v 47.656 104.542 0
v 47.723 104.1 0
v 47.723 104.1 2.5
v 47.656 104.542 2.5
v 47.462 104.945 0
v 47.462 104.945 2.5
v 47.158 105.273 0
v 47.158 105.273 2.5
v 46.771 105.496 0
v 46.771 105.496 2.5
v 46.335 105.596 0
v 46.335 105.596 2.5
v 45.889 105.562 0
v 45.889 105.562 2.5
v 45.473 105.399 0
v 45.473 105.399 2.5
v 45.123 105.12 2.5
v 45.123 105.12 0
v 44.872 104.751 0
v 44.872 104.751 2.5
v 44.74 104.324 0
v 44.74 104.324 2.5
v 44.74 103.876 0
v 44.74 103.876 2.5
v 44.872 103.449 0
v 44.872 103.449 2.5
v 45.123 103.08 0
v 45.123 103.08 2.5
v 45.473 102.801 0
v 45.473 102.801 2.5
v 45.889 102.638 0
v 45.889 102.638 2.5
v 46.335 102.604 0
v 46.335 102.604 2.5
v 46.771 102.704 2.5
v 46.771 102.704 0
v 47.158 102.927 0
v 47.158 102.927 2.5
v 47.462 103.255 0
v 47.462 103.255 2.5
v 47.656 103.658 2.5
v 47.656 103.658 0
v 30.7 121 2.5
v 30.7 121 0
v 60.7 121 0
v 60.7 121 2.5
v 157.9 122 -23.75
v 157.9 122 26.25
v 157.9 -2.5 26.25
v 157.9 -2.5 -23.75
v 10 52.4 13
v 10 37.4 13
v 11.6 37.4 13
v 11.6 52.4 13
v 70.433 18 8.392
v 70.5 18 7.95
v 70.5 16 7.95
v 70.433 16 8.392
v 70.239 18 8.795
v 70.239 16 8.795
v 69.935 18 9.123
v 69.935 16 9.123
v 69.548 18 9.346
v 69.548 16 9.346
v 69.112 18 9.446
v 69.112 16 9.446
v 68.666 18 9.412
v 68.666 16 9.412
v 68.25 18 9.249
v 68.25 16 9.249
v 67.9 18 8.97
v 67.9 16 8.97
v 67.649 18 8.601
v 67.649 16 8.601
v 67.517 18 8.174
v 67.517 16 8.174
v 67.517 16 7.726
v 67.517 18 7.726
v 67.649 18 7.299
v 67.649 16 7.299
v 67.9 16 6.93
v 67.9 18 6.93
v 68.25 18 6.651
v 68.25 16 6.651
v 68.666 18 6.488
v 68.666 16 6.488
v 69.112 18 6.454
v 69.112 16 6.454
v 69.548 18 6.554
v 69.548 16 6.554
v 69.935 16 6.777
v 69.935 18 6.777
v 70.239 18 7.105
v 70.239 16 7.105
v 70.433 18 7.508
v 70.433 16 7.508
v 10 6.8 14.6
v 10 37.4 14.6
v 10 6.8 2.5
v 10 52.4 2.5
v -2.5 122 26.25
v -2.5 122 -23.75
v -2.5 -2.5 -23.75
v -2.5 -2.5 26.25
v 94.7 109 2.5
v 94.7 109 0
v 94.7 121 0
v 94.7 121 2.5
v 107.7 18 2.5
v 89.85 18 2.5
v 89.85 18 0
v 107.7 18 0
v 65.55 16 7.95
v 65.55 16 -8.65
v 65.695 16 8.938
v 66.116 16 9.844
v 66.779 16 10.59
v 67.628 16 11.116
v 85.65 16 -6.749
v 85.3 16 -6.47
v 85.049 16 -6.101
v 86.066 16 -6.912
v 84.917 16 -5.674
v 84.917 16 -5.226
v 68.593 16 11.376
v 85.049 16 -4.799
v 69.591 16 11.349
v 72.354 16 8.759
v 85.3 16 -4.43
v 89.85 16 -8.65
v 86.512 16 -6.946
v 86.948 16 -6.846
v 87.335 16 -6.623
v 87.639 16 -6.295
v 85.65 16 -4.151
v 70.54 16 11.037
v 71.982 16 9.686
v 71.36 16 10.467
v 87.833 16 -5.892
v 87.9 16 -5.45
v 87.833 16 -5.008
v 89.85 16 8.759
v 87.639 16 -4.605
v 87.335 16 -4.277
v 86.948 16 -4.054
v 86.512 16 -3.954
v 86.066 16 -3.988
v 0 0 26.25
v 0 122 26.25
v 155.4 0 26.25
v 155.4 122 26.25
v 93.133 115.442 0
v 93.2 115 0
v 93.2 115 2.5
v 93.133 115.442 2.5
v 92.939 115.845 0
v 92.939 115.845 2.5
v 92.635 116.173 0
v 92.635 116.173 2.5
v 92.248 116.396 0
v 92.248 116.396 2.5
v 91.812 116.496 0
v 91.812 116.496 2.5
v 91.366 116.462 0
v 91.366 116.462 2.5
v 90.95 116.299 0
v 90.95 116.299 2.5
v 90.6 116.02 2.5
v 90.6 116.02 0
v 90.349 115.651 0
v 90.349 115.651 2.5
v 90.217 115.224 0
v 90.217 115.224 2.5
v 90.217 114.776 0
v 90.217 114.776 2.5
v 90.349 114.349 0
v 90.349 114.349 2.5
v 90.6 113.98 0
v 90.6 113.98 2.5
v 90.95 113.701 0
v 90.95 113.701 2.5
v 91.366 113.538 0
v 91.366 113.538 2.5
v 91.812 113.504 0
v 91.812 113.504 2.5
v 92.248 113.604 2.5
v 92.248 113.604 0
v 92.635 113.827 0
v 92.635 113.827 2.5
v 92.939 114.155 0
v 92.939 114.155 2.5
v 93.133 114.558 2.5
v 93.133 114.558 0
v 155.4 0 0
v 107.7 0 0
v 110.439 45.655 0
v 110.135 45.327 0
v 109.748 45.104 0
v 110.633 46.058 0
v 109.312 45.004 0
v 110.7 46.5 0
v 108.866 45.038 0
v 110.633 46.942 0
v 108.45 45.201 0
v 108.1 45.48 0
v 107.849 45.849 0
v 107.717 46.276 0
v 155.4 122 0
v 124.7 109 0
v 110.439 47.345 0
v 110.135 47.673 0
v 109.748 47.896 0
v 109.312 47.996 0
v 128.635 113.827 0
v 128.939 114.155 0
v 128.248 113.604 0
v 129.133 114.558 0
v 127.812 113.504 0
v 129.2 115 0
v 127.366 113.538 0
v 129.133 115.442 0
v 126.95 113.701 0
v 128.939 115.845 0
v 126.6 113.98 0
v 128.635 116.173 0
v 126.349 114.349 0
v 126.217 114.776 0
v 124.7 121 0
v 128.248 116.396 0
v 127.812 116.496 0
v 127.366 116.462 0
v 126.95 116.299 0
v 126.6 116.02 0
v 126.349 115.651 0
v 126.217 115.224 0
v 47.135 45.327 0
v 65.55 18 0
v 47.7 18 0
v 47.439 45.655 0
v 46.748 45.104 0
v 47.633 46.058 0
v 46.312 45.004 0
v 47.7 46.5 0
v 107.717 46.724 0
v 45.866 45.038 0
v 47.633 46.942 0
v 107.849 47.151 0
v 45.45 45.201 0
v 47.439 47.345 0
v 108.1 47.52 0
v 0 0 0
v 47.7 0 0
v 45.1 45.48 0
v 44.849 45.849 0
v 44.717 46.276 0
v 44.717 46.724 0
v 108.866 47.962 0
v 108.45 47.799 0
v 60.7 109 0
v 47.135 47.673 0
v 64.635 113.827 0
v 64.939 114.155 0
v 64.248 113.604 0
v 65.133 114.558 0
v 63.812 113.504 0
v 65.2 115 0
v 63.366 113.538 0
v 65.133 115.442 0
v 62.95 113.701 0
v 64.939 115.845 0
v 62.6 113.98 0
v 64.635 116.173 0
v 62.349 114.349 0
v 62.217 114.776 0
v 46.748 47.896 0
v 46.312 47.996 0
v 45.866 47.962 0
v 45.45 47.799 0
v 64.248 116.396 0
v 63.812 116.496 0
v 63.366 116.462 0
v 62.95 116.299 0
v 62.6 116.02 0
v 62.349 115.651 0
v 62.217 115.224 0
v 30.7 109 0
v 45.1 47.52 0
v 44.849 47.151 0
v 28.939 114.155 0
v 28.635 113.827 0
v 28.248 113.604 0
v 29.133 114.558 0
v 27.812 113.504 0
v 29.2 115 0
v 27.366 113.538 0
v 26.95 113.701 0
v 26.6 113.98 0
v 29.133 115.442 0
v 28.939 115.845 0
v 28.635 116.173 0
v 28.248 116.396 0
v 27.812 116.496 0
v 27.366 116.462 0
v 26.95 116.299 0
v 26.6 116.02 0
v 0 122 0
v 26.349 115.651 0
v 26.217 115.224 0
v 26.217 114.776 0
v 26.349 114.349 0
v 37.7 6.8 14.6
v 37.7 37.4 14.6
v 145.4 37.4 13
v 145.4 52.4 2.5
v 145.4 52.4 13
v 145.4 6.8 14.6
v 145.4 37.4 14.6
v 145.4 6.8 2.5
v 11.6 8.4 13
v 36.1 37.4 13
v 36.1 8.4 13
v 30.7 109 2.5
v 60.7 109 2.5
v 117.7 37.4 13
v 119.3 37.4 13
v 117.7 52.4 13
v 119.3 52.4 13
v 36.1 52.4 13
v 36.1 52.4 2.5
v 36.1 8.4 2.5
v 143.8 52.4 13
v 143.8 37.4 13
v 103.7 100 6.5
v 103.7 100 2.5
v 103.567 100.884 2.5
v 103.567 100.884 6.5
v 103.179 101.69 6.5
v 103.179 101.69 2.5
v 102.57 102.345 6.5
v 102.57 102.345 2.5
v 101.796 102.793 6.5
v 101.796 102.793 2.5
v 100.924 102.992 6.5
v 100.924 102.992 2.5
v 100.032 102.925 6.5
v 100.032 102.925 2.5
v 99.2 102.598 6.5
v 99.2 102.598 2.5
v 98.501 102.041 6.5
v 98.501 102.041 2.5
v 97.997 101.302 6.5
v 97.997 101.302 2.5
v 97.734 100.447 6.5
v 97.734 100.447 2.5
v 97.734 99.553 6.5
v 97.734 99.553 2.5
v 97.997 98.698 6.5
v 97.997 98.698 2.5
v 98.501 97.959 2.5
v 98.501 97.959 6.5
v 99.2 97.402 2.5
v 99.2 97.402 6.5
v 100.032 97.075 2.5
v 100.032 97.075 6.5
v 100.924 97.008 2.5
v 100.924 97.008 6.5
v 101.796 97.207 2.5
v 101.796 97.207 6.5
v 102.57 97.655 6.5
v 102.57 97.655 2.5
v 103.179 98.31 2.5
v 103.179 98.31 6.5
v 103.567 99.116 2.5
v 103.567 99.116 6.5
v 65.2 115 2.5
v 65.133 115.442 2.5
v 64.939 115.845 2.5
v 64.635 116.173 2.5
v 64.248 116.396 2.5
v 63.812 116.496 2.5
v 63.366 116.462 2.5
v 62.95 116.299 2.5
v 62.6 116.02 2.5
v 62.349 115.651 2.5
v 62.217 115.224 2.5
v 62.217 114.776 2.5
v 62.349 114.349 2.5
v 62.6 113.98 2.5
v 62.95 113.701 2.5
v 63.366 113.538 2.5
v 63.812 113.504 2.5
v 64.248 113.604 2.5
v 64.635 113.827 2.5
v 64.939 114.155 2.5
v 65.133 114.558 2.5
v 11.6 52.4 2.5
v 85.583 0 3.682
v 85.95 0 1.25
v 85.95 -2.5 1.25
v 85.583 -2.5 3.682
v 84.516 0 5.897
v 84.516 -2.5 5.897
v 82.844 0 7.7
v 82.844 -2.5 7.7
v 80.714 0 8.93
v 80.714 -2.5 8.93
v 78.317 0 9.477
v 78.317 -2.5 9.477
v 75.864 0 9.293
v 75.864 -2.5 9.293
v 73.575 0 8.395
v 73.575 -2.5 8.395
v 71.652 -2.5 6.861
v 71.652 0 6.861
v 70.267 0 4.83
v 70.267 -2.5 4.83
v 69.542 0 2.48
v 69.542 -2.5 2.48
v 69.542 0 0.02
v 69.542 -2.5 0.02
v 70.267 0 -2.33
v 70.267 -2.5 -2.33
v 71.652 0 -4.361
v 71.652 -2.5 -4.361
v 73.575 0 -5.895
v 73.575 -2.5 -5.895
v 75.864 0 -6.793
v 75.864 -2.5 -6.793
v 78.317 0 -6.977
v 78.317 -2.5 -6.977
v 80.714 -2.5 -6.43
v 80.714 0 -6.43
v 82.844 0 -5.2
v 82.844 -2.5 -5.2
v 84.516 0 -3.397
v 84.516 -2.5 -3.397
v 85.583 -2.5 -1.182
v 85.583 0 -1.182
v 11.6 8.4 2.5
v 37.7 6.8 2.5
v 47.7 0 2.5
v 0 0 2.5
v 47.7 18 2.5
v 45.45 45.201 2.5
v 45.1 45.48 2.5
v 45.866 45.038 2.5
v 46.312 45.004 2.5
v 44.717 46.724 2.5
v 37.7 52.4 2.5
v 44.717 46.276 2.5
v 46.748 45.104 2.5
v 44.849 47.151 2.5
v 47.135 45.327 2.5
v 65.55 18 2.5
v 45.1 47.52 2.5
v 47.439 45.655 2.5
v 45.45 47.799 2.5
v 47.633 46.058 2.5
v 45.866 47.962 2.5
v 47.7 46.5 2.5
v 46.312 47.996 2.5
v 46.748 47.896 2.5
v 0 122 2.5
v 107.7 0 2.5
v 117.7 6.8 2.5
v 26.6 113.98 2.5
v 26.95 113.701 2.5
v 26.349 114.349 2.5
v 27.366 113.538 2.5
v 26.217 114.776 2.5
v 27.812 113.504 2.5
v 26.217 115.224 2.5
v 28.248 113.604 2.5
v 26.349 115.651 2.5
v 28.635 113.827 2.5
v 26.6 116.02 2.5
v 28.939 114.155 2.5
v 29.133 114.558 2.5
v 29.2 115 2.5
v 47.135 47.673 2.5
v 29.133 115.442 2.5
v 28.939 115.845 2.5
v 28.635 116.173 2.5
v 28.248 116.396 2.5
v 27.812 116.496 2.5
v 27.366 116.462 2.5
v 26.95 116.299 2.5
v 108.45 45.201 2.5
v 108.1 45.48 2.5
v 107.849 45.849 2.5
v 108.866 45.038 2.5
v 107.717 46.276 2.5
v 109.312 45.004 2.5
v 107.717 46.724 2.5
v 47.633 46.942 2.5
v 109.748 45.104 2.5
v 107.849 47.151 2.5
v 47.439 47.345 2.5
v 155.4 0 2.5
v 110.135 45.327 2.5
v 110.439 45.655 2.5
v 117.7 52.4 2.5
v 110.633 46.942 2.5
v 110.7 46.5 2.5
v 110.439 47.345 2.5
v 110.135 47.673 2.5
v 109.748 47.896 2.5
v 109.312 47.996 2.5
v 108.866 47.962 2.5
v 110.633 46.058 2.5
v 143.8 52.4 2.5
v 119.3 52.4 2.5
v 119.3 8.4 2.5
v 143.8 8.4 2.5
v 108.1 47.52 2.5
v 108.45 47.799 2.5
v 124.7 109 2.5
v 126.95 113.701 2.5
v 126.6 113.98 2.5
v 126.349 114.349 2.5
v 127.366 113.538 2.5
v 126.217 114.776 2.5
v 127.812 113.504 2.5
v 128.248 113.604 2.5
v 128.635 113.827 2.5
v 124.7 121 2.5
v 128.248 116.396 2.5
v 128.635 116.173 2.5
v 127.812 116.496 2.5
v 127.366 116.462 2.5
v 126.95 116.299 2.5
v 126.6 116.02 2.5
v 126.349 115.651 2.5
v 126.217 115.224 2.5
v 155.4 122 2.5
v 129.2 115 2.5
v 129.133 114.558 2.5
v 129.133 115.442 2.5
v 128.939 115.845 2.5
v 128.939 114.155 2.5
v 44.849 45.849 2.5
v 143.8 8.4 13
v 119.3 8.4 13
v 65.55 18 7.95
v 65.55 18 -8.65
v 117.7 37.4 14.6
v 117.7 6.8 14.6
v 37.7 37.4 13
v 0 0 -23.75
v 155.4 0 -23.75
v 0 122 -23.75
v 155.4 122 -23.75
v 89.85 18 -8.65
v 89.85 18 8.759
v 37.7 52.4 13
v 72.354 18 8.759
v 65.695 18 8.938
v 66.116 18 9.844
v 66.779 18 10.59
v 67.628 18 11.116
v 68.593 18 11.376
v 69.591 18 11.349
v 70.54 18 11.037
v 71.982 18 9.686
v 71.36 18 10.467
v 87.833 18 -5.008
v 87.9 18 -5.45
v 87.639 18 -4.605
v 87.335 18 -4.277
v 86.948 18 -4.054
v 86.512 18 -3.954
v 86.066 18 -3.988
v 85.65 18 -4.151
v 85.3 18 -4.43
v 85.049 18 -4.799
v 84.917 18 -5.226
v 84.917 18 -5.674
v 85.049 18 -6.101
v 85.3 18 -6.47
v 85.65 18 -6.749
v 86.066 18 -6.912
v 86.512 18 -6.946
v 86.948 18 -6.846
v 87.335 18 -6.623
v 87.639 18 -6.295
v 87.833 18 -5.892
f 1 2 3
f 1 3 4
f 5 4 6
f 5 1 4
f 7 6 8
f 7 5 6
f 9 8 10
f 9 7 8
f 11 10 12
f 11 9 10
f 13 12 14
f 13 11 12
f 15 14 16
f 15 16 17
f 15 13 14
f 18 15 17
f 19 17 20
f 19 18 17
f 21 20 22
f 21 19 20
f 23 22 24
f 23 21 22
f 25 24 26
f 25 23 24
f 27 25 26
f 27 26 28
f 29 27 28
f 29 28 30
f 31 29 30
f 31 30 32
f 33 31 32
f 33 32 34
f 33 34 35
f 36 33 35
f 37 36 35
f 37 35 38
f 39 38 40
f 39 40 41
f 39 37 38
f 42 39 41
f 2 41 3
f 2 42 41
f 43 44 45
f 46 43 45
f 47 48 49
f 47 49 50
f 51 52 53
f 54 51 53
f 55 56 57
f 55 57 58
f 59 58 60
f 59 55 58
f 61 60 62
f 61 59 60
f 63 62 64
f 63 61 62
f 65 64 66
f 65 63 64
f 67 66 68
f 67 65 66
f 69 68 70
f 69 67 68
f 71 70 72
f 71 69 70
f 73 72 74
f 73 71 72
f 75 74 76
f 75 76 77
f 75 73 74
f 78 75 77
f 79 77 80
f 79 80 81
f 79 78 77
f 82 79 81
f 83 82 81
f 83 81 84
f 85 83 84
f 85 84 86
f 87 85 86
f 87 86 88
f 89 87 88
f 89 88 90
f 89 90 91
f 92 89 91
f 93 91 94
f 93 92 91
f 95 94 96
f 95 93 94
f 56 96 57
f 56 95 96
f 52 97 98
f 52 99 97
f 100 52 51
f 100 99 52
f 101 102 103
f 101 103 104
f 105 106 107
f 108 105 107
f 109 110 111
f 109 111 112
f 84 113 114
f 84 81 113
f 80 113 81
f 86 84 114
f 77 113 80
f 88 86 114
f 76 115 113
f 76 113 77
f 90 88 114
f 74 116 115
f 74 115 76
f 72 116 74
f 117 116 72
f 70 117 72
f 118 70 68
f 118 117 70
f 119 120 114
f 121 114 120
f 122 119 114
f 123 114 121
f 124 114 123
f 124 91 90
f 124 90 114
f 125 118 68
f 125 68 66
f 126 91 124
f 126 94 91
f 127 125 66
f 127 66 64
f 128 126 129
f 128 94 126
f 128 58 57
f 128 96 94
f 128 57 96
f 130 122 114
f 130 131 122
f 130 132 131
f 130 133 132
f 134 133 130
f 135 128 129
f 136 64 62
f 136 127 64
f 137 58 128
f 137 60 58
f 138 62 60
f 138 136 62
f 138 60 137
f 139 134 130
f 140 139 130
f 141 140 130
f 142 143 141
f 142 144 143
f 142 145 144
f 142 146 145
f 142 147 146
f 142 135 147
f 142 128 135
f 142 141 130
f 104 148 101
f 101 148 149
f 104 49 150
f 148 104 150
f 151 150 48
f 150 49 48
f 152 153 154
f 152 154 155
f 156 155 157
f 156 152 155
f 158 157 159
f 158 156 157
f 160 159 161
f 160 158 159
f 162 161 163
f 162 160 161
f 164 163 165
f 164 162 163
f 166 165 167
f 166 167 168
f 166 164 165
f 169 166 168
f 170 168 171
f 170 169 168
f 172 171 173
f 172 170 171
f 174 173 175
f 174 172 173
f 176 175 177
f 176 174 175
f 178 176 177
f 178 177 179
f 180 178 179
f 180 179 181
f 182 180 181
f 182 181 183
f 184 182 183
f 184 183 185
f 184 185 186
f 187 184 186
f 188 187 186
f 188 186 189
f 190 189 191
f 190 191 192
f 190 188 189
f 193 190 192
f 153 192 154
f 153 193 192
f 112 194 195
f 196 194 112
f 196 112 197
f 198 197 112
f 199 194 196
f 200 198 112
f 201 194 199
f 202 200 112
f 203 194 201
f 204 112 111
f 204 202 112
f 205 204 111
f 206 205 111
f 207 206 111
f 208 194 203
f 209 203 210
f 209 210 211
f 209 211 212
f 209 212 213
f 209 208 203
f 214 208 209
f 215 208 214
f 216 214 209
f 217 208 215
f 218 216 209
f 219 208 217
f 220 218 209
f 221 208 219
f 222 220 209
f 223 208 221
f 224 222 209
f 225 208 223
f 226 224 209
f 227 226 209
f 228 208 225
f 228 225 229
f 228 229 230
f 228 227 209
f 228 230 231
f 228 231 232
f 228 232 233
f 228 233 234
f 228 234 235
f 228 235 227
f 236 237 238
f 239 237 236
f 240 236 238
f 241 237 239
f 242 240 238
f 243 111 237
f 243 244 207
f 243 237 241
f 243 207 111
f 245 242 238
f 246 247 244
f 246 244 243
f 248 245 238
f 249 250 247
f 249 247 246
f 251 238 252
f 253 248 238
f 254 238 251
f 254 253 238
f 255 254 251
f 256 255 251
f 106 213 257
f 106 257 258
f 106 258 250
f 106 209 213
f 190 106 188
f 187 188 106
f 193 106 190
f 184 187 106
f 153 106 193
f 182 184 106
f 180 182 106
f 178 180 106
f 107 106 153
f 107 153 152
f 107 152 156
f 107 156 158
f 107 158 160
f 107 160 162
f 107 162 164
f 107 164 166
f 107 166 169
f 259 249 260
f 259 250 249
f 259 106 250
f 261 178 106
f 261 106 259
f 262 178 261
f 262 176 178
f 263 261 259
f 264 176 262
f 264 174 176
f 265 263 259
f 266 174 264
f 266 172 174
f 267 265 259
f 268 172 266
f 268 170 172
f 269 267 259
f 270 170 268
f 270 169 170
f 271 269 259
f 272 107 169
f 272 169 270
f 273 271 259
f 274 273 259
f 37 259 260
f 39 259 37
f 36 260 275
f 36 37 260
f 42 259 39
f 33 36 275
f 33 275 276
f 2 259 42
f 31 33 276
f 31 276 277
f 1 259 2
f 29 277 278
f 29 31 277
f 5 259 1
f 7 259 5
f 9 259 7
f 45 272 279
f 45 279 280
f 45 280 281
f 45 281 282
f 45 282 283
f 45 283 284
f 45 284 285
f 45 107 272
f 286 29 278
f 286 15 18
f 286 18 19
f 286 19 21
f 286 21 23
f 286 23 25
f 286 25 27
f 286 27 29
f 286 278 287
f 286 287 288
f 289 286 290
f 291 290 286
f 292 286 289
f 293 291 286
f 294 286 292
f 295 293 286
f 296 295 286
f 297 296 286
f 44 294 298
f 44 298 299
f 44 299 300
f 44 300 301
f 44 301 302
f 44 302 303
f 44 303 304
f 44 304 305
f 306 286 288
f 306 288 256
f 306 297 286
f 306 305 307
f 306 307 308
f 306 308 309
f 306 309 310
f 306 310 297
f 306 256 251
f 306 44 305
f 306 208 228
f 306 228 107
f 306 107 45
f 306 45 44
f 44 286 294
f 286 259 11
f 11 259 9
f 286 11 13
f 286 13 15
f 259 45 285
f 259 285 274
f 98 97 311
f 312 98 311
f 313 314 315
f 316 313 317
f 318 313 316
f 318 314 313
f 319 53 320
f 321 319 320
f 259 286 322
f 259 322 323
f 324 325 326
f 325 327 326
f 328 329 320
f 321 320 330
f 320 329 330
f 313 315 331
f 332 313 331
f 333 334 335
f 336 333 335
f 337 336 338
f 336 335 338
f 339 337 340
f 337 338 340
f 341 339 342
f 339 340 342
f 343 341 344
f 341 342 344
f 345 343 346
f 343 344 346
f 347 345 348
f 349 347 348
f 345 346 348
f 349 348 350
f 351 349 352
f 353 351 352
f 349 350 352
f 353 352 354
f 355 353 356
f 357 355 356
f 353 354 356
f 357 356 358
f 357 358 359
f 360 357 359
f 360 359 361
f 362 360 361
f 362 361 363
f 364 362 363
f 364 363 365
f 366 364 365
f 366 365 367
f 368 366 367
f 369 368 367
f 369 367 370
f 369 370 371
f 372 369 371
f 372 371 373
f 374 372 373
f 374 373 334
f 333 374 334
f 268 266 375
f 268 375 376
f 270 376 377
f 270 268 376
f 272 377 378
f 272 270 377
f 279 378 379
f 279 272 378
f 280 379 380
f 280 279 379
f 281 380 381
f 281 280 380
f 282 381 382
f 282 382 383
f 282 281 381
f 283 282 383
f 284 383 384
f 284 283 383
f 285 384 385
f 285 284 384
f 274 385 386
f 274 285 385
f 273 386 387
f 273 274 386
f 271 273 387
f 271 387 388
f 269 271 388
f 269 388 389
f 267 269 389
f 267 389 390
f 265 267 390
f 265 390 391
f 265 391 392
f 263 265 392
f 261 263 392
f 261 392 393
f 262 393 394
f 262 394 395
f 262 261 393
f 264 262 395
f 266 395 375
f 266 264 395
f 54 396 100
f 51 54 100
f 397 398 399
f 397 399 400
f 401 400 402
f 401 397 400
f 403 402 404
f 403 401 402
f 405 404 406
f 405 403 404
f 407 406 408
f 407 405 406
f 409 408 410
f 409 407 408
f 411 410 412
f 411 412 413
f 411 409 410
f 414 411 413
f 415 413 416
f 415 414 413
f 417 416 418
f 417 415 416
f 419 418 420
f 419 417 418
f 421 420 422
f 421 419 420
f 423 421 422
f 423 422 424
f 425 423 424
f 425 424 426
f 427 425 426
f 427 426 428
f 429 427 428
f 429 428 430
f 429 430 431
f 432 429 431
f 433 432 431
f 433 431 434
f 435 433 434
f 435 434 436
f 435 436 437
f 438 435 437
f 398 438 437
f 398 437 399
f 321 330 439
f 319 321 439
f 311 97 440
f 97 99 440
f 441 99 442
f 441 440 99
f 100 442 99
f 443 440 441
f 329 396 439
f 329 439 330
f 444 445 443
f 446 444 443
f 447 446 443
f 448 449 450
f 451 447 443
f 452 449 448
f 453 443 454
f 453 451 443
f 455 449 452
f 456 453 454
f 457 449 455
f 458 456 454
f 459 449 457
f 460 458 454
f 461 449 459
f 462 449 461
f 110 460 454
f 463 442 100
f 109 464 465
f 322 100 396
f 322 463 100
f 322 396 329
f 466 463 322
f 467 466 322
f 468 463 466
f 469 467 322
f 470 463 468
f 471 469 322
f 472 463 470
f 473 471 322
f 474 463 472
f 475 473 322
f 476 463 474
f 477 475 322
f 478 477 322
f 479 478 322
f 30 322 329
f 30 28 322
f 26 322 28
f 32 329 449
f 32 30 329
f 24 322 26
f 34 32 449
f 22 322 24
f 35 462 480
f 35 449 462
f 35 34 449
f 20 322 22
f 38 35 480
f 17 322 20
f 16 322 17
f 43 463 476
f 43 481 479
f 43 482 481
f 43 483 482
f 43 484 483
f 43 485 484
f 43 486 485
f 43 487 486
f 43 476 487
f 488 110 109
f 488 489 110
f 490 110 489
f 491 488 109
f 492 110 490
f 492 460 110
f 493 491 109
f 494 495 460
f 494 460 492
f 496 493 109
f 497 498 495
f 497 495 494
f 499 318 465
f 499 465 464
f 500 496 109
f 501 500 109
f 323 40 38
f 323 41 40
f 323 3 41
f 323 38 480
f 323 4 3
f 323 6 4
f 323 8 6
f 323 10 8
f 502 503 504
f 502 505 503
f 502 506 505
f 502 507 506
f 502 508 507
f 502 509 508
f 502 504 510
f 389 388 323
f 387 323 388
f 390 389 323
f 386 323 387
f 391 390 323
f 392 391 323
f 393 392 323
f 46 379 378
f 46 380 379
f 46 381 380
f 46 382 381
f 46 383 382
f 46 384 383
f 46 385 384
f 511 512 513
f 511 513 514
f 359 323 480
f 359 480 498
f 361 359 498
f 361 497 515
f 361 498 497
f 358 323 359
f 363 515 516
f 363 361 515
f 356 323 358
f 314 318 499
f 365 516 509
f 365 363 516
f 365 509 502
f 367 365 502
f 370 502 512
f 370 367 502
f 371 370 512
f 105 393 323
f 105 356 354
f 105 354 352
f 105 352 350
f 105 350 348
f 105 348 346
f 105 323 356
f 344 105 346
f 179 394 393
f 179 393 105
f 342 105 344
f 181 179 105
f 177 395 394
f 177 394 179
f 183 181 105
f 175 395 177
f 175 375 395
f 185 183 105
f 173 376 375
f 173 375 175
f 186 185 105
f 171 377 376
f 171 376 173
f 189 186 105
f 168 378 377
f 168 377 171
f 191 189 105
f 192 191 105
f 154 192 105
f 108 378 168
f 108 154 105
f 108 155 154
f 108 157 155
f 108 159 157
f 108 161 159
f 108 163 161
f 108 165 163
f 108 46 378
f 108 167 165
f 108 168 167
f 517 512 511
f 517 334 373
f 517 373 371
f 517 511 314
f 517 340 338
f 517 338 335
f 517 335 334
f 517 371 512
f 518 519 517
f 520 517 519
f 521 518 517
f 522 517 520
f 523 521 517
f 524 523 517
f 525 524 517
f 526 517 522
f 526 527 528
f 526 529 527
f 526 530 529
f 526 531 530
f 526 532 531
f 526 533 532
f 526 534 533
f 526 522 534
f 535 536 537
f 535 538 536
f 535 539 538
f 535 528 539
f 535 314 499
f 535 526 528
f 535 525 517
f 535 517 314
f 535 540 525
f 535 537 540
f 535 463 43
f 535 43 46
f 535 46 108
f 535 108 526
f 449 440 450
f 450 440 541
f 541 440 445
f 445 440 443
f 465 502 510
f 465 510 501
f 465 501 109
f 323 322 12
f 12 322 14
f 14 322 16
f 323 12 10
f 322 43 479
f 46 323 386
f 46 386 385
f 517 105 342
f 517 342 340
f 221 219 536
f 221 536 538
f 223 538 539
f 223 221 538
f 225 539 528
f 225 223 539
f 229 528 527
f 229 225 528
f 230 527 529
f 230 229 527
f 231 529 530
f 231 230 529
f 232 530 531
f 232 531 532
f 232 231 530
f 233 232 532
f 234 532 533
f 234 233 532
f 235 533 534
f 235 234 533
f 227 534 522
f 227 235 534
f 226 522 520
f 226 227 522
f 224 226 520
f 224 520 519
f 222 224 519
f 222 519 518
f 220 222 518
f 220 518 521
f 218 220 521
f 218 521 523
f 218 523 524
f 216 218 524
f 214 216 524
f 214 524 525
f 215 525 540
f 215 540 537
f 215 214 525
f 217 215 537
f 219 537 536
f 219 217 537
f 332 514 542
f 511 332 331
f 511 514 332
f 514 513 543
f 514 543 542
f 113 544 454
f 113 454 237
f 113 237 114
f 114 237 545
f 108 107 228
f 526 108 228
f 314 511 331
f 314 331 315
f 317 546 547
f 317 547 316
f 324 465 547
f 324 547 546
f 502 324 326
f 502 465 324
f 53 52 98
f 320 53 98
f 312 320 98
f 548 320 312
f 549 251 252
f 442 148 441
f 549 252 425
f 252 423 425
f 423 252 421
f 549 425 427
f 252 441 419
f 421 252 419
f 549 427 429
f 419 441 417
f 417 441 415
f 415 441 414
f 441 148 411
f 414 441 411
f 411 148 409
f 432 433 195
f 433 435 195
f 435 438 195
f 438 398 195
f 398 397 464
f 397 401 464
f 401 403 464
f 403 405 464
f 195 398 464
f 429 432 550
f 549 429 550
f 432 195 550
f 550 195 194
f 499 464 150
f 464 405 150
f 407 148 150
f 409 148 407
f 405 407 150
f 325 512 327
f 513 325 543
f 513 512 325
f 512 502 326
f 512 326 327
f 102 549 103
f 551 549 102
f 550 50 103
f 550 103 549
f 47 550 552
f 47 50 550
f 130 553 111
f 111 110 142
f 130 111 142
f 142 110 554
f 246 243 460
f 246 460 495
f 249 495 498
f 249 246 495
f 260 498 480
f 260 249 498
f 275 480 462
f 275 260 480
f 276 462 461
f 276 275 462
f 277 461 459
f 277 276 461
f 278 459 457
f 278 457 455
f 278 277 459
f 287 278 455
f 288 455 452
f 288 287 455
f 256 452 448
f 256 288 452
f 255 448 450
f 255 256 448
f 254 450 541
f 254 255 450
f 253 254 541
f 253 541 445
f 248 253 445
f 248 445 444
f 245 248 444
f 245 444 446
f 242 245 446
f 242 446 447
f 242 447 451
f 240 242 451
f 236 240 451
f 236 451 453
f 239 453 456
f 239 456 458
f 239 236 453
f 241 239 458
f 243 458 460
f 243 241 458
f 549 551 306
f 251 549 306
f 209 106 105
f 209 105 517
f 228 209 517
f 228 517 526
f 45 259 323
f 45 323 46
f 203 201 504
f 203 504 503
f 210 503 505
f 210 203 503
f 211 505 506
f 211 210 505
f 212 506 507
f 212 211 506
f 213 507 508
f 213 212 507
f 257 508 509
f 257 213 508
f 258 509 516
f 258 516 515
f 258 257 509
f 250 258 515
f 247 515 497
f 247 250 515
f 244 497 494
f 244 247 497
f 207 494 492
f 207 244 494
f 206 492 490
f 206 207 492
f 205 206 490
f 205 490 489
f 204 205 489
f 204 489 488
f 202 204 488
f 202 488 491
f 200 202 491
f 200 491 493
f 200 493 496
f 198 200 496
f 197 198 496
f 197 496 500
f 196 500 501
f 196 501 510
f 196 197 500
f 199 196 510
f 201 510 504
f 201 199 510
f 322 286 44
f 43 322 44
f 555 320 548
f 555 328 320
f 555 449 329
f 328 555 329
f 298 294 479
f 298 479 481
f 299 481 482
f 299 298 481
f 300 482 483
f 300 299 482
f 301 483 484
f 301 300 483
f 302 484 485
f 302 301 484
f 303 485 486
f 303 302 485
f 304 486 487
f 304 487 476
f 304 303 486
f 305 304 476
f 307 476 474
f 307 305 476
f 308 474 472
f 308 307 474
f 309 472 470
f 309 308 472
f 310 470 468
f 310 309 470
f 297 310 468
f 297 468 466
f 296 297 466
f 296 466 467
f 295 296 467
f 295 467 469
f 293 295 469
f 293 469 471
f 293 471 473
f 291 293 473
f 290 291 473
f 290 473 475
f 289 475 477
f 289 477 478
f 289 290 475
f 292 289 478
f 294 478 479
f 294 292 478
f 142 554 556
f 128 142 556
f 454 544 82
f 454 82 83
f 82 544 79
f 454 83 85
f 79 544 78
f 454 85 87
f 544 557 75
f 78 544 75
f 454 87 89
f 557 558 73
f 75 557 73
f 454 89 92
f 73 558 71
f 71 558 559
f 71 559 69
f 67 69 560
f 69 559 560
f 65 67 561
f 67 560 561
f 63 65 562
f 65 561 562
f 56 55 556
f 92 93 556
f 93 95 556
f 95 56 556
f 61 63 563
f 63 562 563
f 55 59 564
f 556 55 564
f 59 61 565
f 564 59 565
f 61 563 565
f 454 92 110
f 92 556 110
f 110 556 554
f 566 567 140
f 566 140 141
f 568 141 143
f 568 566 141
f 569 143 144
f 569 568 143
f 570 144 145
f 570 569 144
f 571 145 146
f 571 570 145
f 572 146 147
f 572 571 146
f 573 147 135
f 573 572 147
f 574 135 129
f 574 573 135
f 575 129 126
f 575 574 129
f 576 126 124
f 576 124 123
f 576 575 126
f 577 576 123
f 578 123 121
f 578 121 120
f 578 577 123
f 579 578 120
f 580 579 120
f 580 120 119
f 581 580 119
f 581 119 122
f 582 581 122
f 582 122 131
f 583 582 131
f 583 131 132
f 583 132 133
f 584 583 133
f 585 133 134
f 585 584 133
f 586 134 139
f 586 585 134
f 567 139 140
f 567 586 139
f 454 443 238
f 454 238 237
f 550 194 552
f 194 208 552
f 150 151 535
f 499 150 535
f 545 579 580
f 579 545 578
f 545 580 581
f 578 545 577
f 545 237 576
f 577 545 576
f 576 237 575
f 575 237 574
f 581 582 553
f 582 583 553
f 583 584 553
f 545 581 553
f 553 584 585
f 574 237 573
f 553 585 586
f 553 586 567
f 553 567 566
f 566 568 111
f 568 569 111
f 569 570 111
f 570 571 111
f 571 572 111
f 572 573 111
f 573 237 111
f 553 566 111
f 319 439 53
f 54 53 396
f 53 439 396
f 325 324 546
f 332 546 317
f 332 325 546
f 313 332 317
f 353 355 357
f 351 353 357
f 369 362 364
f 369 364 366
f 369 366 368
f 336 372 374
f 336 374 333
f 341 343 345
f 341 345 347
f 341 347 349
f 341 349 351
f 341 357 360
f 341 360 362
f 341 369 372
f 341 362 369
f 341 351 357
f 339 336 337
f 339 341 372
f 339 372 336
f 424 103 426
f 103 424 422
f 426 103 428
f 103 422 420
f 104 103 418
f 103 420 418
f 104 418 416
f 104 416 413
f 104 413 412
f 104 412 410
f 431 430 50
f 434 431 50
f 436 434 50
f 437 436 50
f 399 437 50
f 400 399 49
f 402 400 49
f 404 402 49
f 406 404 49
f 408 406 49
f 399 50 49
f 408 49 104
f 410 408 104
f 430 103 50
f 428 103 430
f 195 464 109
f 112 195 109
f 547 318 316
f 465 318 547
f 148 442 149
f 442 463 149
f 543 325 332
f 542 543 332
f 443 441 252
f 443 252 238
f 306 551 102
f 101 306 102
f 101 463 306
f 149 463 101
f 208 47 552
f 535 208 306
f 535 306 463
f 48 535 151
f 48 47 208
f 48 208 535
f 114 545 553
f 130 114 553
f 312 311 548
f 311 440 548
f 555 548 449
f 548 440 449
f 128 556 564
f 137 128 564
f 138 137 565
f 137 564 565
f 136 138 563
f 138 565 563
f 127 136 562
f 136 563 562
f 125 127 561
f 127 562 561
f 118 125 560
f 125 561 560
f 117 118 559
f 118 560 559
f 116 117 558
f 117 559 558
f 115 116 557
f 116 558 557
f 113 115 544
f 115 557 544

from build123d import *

# Parameters (mm, degrees)
SKETCH1_W           = 155.4
SKETCH1_H           = 122
SKETCH1_R           = 1.5
SKETCH1_W_2         = 30
SKETCH1_H_2         = 12
BOSS_EXTRUDE1_DEPTH = 2.5
SKETCH1_5_R         = 3
BOSS_EXTRUDE2_DEPTH = 6.5
BOSS_EXTRUDE3_DEPTH = 13
SKETCH2_W           = 27.7
SKETCH2_H           = 30.6
BOSS_EXTRUDE4_DEPTH = 1.6
SKETCH3_W           = 155.4
SKETCH3_H           = 50
SKETCH3_R           = 8.25
BOSS_EXTRUDE5_DEPTH = 2.5
SKETCH4_W           = 60
SKETCH4_H           = 18
CUT_EXTRUDE1_DEPTH  = 10
SKETCH6_R           = 1.5
BOSS_EXTRUDE6_DEPTH = 2
SKETCH7_W           = 50
SKETCH7_H           = 124.5
BOSS_EXTRUDE7_DEPTH = 2.5
SKETCH8_W           = 50
SKETCH8_H           = 124.5
BOSS_EXTRUDE8_DEPTH = 2.5


with BuildPart() as part:
    # Sketch1 → Boss-Extrude1 (new body)
    with BuildSketch(Plane.XY):
        with Locations((77.7, 61)):
            Rectangle(SKETCH1_W, SKETCH1_H)
        with Locations((46.2, 46.5)):
            Circle(SKETCH1_R, mode=Mode.SUBTRACT)
        with Locations((109.2, 46.5)):
            Circle(SKETCH1_R, mode=Mode.SUBTRACT)
        with Locations((27.7, 115)):
            Circle(SKETCH1_R, mode=Mode.SUBTRACT)
        with Locations((46.223, 104.1)):
            Circle(SKETCH1_R, mode=Mode.SUBTRACT)
        with Locations((45.7, 115)):
            Rectangle(SKETCH1_W_2, SKETCH1_H_2, mode=Mode.SUBTRACT)
        with Locations((63.7, 115)):
            Circle(SKETCH1_R, mode=Mode.SUBTRACT)
        with Locations((91.7, 115)):
            Circle(SKETCH1_R, mode=Mode.SUBTRACT)
        with Locations((109.7, 115)):
            Rectangle(SKETCH1_W_2, SKETCH1_H_2, mode=Mode.SUBTRACT)
        with Locations((127.7, 115)):
            Circle(SKETCH1_R, mode=Mode.SUBTRACT)
    extrude(amount=BOSS_EXTRUDE1_DEPTH)

    # Sketch1<5> → Boss-Extrude2 (add)
    with BuildSketch(Plane.XY):
        with Locations((100.7, 100)):
            Circle(SKETCH1_5_R)
    extrude(amount=BOSS_EXTRUDE2_DEPTH)

    # Sketch1<6> → Boss-Extrude3 (add)
    with BuildSketch(Plane.XY):
        Polygon((145.4, 6.8), (145.4, 52.4), (143.8, 52.4), (143.8, 8.4), (119.3, 8.4), (119.3, 52.4), (117.7, 52.4), (117.7, 6.8), align=None)
        Polygon((10, 52.4), (10, 6.8), (37.7, 6.8), (37.7, 52.4), (36.1, 52.4), (36.1, 8.4), (11.6, 8.4), (11.6, 52.4), align=None)
    extrude(amount=BOSS_EXTRUDE3_DEPTH)

    # Sketch2 → Boss-Extrude4 (add)
    with BuildSketch(Plane.XY.offset(13)):
        with Locations((23.85, 22.1)):
            Rectangle(SKETCH2_W, SKETCH2_H)
        with Locations((131.55, 22.1)):
            Rectangle(SKETCH2_W, SKETCH2_H)
    extrude(amount=BOSS_EXTRUDE4_DEPTH)

    # Sketch3 → Boss-Extrude5 (add)
    with BuildSketch(Plane.XZ):
        with Locations((77.7, 1.25)):
            Rectangle(SKETCH3_W, SKETCH3_H)
        with Locations((77.7, 1.25)):
            Circle(SKETCH3_R, mode=Mode.SUBTRACT)
    extrude(amount=BOSS_EXTRUDE5_DEPTH)

    # Sketch4 → Cut-Extrude1 (cut)
    with BuildSketch(Plane.XY.offset(2.5)):
        with Locations((77.7, 9)):
            Rectangle(SKETCH4_W, SKETCH4_H)
    extrude(amount=-CUT_EXTRUDE1_DEPTH, mode=Mode.SUBTRACT)

    # Sketch6 → Boss-Extrude6 (add)
    with BuildSketch(Plane.XZ.offset(-18)):
        with BuildLine():
            Line((89.85, 8.759024603), (72.353800708, 8.759024603))
            ThreePointArc((72.353800708, 8.759024603), (68.592638026, 11.375865762), (65.55, 7.95))
            Line((65.55, 7.95), (65.55, -8.65))
            Line((65.55, -8.65), (89.85, -8.65))
            Line((89.85, -8.65), (89.85, 8.759024603))
        make_face()
        with Locations((69, 7.95)):
            Circle(SKETCH6_R, mode=Mode.SUBTRACT)
        with Locations((86.4, -5.45)):
            Circle(SKETCH6_R, mode=Mode.SUBTRACT)
    extrude(amount=BOSS_EXTRUDE6_DEPTH)

    # Sketch7 → Boss-Extrude7 (add)
    with BuildSketch(Plane(origin=(155.4, 0, 0), x_dir=(0, 0, -1), z_dir=(1, 0, 0))):
        with Locations((-1.25, 59.75)):
            Rectangle(SKETCH7_W, SKETCH7_H)
    extrude(amount=BOSS_EXTRUDE7_DEPTH)

    # Sketch8 → Boss-Extrude8 (add)
    with BuildSketch(Plane.ZY):
        with Locations((1.25, 59.75)):
            Rectangle(SKETCH8_W, SKETCH8_H)
    extrude(amount=BOSS_EXTRUDE8_DEPTH)


solid = part.part
